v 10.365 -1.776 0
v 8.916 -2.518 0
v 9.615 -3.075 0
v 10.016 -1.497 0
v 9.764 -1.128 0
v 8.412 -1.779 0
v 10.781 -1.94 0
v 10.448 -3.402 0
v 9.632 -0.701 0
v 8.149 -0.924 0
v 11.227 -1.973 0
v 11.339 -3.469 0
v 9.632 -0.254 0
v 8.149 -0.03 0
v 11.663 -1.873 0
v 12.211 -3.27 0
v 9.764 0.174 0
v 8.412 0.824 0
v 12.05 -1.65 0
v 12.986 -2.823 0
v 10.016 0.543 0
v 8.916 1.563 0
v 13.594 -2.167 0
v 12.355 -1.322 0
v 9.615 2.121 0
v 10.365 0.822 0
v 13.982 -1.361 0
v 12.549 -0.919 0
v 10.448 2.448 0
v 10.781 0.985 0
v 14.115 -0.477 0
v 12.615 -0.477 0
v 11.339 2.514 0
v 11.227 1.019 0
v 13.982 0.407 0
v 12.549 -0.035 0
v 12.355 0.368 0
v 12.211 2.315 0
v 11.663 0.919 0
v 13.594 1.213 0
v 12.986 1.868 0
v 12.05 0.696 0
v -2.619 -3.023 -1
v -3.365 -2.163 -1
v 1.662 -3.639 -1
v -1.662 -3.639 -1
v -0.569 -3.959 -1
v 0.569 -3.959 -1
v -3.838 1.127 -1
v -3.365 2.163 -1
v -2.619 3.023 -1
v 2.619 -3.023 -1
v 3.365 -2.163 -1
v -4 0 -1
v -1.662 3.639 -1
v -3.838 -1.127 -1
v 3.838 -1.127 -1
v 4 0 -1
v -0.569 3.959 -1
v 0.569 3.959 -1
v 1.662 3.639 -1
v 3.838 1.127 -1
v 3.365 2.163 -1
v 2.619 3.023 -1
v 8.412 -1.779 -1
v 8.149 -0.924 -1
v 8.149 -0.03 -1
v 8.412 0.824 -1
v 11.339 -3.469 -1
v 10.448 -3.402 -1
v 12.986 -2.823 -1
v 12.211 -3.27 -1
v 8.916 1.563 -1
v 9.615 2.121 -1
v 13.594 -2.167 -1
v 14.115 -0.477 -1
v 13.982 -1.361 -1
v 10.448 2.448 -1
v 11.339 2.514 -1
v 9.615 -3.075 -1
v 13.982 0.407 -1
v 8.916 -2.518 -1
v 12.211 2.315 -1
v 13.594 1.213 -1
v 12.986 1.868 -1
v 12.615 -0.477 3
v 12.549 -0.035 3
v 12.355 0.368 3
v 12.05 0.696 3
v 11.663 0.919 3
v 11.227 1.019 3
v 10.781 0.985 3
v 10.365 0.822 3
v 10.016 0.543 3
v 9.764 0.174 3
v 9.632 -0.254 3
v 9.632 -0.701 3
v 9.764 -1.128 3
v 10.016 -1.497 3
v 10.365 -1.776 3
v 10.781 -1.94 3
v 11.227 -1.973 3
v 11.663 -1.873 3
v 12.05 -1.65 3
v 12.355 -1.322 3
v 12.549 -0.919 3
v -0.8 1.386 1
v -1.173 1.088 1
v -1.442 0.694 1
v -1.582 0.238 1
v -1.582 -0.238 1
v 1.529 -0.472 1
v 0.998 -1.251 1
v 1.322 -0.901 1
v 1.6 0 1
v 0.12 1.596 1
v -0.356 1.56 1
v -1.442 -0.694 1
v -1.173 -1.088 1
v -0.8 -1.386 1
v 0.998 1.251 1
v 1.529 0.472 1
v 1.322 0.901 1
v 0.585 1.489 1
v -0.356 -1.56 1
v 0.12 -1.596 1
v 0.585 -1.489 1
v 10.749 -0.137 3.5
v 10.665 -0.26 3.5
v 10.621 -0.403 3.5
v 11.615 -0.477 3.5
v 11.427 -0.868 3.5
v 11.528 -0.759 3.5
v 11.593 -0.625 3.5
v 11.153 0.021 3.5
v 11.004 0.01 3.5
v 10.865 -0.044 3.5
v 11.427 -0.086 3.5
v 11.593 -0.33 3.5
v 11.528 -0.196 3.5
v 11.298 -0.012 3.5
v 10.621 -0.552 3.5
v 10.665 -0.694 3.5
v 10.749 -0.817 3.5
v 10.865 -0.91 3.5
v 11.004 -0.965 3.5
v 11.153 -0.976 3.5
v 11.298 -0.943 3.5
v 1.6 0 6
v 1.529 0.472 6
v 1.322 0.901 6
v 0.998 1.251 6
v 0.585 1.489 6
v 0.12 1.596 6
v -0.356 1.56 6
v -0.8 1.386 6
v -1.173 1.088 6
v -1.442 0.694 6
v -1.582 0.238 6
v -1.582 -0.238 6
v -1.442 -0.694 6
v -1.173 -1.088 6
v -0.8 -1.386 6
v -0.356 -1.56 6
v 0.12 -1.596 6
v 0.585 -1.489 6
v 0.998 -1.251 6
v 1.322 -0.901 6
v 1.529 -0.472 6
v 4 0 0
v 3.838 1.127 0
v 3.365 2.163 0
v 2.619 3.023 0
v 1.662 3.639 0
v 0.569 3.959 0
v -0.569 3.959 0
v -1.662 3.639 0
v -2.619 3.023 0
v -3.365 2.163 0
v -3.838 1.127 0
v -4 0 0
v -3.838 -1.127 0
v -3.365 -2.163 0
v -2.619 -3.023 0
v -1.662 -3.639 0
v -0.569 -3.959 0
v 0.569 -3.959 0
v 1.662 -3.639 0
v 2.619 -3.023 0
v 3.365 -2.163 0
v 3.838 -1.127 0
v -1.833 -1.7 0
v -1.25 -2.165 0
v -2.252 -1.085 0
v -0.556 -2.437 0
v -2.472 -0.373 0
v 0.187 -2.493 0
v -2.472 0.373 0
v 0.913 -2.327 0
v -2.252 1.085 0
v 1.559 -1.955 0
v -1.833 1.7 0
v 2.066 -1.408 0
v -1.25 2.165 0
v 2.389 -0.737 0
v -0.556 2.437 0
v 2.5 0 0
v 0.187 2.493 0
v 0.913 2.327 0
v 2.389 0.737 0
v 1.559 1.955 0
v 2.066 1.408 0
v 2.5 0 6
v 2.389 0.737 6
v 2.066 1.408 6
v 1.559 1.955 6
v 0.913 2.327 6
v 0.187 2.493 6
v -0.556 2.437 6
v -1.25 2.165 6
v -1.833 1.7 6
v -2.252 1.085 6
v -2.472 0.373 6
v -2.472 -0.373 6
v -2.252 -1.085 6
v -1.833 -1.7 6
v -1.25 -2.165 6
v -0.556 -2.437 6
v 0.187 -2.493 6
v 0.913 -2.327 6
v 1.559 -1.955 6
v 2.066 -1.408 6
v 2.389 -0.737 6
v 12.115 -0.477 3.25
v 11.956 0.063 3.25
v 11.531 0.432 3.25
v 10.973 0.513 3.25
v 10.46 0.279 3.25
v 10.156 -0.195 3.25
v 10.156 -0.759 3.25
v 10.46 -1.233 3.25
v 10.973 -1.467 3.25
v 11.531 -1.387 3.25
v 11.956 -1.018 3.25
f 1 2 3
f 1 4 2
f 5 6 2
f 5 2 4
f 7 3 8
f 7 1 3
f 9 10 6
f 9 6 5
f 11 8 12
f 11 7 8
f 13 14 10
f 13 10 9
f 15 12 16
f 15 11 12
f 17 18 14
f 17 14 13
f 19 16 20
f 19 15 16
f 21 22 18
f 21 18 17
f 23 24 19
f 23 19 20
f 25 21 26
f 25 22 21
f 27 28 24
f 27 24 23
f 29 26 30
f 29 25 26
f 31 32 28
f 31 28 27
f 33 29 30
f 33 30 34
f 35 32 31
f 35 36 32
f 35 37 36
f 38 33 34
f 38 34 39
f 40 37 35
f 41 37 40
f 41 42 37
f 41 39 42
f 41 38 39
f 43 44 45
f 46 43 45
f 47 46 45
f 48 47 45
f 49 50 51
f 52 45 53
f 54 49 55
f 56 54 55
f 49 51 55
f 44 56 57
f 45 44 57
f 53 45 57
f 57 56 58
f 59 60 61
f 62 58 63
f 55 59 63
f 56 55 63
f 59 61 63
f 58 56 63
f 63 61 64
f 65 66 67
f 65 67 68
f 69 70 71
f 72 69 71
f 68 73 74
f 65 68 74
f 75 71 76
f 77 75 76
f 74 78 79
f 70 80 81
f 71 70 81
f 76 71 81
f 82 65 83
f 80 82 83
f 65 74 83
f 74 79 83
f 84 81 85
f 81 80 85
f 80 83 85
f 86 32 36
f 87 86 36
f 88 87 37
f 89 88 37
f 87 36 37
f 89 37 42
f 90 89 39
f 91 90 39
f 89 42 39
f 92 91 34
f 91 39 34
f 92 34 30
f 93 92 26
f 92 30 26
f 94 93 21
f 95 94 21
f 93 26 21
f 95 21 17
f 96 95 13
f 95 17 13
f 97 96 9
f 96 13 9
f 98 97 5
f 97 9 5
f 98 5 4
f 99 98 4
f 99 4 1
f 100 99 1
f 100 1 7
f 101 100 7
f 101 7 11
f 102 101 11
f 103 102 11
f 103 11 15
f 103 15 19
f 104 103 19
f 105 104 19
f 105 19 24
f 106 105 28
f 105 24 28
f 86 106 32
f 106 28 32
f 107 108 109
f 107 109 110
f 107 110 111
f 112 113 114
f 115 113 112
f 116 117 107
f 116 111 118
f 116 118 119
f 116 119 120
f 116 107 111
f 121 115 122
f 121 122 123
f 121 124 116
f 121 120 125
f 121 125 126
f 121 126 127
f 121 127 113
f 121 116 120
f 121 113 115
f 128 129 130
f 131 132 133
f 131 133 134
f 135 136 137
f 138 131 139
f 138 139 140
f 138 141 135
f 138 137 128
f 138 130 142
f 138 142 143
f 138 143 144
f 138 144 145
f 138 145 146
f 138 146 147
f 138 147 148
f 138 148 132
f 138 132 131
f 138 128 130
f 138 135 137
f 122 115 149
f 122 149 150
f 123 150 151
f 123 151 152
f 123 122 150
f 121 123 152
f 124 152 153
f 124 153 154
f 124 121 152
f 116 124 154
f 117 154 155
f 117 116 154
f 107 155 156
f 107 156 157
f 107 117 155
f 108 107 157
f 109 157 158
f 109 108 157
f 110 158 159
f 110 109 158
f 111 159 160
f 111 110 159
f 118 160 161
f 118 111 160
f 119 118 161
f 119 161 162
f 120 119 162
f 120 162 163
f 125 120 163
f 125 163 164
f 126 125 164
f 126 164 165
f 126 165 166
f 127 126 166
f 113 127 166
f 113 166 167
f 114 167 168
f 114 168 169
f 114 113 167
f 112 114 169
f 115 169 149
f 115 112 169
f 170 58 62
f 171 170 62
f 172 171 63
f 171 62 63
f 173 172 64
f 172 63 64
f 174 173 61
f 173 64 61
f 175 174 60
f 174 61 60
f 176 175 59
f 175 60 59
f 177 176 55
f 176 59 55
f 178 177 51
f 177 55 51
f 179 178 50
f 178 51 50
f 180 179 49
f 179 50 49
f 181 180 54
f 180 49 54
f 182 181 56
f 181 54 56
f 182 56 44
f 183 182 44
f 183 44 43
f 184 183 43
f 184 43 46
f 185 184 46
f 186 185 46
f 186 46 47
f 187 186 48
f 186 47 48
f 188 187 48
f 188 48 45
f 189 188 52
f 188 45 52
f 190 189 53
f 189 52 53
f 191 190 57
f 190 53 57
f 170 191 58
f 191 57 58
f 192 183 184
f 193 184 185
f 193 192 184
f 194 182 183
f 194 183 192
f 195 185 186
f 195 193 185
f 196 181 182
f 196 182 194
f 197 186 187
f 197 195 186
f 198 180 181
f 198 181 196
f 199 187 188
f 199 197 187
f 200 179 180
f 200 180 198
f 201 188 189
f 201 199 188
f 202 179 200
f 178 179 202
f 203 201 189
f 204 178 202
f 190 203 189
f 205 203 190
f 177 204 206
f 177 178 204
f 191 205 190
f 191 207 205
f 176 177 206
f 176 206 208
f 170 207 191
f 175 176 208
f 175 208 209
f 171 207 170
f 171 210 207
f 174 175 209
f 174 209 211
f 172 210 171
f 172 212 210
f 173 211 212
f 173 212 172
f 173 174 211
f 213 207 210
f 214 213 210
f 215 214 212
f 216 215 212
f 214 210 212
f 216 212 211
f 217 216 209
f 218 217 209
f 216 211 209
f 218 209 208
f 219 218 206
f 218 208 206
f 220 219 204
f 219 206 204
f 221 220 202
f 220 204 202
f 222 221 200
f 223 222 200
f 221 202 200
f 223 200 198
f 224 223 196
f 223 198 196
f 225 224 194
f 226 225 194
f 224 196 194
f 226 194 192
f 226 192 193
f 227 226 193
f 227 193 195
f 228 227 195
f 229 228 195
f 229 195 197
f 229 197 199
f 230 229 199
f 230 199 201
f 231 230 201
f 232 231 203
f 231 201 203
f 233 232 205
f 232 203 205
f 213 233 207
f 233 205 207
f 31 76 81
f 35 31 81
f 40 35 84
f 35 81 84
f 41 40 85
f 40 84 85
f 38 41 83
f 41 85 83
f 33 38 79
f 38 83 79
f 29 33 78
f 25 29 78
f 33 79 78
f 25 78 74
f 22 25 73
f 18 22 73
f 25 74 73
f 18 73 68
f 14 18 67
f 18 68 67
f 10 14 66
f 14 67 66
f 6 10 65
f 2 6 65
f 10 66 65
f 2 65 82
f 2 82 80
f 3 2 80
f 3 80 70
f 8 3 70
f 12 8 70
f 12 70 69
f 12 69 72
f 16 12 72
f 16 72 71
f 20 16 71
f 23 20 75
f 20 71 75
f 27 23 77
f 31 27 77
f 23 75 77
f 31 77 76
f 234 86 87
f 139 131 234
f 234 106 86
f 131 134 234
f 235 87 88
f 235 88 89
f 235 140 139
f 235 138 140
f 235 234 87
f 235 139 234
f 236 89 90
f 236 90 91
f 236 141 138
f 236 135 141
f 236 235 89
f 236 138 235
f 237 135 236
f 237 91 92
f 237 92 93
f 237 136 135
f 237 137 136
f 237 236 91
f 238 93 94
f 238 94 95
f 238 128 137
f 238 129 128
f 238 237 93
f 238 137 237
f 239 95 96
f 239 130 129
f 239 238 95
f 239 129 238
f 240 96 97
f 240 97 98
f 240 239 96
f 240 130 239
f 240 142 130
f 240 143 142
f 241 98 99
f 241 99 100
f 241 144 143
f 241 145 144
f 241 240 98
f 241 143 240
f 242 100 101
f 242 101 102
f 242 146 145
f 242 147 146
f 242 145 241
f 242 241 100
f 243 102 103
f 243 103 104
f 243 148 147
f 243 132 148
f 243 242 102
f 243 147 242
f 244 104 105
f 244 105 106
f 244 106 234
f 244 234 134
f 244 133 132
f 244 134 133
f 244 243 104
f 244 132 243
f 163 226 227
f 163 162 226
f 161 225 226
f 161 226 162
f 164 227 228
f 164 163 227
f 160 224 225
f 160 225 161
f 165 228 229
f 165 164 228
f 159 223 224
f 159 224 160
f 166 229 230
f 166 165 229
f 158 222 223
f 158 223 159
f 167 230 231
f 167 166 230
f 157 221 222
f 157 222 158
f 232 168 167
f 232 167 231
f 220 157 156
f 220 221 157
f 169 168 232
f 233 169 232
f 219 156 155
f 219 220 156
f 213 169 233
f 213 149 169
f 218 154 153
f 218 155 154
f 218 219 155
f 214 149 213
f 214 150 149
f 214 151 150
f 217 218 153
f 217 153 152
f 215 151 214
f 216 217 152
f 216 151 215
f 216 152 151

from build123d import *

# Parameters (mm, degrees)
CYLINDER003_R     = 1.5
CYLINDER003_DEPTH = 3
CYLINDER004_R     = 3
CYLINDER004_DEPTH = 1
CYLINDER001_R     = 4
CYLINDER001_DEPTH = 1
CYLINDER002_R     = 1.6
CYLINDER002_DEPTH = 5
CYLINDER_R        = 2.5
CYLINDER_DEPTH    = 6


with BuildPart() as cone:
    # Cone → Cone (revolve)
    with BuildSketch(Plane(origin=(11.115233, -0.477186, 3), x_dir=(1, 0, 0), z_dir=(0, -1, 0))):
        Polygon((0, 0), (1.5, 0), (0.5, 0.5), (0, 0.5), align=None)
    revolve(axis=Axis((11.115233, -0.477186, 3), (0, 0, 1)))


with BuildPart() as cylinder003:
    # Cylinder003 → Cylinder003 (new body)
    with BuildSketch(Plane(origin=(11.115233, -0.477186, 0), x_dir=(1, 0, 0), z_dir=(0, 0, 1))):
        Circle(CYLINDER003_R)
    extrude(amount=CYLINDER003_DEPTH)


with BuildPart() as fusion001:
    # Cylinder004 → Cylinder004 (new body)
    with BuildSketch(Plane(origin=(11.115233, -0.477186, -1), x_dir=(1, 0, 0), z_dir=(0, 0, 1))):
        Circle(CYLINDER004_R)
    extrude(amount=CYLINDER004_DEPTH)

    # Fusion: union Cylinder003
    add(cylinder003.part)

    # Fusion001: union Cone
    add(cone.part)


with BuildPart() as cylinder001:
    # Cylinder001 → Cylinder001 (new body)
    with BuildSketch(Plane.XY.offset(-1)):
        Circle(CYLINDER001_R)
    extrude(amount=CYLINDER001_DEPTH)


with BuildPart() as cylinder002:
    # Cylinder002 → Cylinder002 (new body)
    with BuildSketch(Plane.XY.offset(1)):
        Circle(CYLINDER002_R)
    extrude(amount=CYLINDER002_DEPTH)


with BuildPart() as fusion002:
    # Cylinder → Cylinder (new body)
    with BuildSketch(Plane.XY):
        Circle(CYLINDER_R)
    extrude(amount=CYLINDER_DEPTH)

    # Cut: cut Cylinder002
    add(cylinder002.part, mode=Mode.SUBTRACT)

    # Fusion002: union Cylinder001
    add(cylinder001.part)


solid = Compound([fusion001.part, fusion002.part])
